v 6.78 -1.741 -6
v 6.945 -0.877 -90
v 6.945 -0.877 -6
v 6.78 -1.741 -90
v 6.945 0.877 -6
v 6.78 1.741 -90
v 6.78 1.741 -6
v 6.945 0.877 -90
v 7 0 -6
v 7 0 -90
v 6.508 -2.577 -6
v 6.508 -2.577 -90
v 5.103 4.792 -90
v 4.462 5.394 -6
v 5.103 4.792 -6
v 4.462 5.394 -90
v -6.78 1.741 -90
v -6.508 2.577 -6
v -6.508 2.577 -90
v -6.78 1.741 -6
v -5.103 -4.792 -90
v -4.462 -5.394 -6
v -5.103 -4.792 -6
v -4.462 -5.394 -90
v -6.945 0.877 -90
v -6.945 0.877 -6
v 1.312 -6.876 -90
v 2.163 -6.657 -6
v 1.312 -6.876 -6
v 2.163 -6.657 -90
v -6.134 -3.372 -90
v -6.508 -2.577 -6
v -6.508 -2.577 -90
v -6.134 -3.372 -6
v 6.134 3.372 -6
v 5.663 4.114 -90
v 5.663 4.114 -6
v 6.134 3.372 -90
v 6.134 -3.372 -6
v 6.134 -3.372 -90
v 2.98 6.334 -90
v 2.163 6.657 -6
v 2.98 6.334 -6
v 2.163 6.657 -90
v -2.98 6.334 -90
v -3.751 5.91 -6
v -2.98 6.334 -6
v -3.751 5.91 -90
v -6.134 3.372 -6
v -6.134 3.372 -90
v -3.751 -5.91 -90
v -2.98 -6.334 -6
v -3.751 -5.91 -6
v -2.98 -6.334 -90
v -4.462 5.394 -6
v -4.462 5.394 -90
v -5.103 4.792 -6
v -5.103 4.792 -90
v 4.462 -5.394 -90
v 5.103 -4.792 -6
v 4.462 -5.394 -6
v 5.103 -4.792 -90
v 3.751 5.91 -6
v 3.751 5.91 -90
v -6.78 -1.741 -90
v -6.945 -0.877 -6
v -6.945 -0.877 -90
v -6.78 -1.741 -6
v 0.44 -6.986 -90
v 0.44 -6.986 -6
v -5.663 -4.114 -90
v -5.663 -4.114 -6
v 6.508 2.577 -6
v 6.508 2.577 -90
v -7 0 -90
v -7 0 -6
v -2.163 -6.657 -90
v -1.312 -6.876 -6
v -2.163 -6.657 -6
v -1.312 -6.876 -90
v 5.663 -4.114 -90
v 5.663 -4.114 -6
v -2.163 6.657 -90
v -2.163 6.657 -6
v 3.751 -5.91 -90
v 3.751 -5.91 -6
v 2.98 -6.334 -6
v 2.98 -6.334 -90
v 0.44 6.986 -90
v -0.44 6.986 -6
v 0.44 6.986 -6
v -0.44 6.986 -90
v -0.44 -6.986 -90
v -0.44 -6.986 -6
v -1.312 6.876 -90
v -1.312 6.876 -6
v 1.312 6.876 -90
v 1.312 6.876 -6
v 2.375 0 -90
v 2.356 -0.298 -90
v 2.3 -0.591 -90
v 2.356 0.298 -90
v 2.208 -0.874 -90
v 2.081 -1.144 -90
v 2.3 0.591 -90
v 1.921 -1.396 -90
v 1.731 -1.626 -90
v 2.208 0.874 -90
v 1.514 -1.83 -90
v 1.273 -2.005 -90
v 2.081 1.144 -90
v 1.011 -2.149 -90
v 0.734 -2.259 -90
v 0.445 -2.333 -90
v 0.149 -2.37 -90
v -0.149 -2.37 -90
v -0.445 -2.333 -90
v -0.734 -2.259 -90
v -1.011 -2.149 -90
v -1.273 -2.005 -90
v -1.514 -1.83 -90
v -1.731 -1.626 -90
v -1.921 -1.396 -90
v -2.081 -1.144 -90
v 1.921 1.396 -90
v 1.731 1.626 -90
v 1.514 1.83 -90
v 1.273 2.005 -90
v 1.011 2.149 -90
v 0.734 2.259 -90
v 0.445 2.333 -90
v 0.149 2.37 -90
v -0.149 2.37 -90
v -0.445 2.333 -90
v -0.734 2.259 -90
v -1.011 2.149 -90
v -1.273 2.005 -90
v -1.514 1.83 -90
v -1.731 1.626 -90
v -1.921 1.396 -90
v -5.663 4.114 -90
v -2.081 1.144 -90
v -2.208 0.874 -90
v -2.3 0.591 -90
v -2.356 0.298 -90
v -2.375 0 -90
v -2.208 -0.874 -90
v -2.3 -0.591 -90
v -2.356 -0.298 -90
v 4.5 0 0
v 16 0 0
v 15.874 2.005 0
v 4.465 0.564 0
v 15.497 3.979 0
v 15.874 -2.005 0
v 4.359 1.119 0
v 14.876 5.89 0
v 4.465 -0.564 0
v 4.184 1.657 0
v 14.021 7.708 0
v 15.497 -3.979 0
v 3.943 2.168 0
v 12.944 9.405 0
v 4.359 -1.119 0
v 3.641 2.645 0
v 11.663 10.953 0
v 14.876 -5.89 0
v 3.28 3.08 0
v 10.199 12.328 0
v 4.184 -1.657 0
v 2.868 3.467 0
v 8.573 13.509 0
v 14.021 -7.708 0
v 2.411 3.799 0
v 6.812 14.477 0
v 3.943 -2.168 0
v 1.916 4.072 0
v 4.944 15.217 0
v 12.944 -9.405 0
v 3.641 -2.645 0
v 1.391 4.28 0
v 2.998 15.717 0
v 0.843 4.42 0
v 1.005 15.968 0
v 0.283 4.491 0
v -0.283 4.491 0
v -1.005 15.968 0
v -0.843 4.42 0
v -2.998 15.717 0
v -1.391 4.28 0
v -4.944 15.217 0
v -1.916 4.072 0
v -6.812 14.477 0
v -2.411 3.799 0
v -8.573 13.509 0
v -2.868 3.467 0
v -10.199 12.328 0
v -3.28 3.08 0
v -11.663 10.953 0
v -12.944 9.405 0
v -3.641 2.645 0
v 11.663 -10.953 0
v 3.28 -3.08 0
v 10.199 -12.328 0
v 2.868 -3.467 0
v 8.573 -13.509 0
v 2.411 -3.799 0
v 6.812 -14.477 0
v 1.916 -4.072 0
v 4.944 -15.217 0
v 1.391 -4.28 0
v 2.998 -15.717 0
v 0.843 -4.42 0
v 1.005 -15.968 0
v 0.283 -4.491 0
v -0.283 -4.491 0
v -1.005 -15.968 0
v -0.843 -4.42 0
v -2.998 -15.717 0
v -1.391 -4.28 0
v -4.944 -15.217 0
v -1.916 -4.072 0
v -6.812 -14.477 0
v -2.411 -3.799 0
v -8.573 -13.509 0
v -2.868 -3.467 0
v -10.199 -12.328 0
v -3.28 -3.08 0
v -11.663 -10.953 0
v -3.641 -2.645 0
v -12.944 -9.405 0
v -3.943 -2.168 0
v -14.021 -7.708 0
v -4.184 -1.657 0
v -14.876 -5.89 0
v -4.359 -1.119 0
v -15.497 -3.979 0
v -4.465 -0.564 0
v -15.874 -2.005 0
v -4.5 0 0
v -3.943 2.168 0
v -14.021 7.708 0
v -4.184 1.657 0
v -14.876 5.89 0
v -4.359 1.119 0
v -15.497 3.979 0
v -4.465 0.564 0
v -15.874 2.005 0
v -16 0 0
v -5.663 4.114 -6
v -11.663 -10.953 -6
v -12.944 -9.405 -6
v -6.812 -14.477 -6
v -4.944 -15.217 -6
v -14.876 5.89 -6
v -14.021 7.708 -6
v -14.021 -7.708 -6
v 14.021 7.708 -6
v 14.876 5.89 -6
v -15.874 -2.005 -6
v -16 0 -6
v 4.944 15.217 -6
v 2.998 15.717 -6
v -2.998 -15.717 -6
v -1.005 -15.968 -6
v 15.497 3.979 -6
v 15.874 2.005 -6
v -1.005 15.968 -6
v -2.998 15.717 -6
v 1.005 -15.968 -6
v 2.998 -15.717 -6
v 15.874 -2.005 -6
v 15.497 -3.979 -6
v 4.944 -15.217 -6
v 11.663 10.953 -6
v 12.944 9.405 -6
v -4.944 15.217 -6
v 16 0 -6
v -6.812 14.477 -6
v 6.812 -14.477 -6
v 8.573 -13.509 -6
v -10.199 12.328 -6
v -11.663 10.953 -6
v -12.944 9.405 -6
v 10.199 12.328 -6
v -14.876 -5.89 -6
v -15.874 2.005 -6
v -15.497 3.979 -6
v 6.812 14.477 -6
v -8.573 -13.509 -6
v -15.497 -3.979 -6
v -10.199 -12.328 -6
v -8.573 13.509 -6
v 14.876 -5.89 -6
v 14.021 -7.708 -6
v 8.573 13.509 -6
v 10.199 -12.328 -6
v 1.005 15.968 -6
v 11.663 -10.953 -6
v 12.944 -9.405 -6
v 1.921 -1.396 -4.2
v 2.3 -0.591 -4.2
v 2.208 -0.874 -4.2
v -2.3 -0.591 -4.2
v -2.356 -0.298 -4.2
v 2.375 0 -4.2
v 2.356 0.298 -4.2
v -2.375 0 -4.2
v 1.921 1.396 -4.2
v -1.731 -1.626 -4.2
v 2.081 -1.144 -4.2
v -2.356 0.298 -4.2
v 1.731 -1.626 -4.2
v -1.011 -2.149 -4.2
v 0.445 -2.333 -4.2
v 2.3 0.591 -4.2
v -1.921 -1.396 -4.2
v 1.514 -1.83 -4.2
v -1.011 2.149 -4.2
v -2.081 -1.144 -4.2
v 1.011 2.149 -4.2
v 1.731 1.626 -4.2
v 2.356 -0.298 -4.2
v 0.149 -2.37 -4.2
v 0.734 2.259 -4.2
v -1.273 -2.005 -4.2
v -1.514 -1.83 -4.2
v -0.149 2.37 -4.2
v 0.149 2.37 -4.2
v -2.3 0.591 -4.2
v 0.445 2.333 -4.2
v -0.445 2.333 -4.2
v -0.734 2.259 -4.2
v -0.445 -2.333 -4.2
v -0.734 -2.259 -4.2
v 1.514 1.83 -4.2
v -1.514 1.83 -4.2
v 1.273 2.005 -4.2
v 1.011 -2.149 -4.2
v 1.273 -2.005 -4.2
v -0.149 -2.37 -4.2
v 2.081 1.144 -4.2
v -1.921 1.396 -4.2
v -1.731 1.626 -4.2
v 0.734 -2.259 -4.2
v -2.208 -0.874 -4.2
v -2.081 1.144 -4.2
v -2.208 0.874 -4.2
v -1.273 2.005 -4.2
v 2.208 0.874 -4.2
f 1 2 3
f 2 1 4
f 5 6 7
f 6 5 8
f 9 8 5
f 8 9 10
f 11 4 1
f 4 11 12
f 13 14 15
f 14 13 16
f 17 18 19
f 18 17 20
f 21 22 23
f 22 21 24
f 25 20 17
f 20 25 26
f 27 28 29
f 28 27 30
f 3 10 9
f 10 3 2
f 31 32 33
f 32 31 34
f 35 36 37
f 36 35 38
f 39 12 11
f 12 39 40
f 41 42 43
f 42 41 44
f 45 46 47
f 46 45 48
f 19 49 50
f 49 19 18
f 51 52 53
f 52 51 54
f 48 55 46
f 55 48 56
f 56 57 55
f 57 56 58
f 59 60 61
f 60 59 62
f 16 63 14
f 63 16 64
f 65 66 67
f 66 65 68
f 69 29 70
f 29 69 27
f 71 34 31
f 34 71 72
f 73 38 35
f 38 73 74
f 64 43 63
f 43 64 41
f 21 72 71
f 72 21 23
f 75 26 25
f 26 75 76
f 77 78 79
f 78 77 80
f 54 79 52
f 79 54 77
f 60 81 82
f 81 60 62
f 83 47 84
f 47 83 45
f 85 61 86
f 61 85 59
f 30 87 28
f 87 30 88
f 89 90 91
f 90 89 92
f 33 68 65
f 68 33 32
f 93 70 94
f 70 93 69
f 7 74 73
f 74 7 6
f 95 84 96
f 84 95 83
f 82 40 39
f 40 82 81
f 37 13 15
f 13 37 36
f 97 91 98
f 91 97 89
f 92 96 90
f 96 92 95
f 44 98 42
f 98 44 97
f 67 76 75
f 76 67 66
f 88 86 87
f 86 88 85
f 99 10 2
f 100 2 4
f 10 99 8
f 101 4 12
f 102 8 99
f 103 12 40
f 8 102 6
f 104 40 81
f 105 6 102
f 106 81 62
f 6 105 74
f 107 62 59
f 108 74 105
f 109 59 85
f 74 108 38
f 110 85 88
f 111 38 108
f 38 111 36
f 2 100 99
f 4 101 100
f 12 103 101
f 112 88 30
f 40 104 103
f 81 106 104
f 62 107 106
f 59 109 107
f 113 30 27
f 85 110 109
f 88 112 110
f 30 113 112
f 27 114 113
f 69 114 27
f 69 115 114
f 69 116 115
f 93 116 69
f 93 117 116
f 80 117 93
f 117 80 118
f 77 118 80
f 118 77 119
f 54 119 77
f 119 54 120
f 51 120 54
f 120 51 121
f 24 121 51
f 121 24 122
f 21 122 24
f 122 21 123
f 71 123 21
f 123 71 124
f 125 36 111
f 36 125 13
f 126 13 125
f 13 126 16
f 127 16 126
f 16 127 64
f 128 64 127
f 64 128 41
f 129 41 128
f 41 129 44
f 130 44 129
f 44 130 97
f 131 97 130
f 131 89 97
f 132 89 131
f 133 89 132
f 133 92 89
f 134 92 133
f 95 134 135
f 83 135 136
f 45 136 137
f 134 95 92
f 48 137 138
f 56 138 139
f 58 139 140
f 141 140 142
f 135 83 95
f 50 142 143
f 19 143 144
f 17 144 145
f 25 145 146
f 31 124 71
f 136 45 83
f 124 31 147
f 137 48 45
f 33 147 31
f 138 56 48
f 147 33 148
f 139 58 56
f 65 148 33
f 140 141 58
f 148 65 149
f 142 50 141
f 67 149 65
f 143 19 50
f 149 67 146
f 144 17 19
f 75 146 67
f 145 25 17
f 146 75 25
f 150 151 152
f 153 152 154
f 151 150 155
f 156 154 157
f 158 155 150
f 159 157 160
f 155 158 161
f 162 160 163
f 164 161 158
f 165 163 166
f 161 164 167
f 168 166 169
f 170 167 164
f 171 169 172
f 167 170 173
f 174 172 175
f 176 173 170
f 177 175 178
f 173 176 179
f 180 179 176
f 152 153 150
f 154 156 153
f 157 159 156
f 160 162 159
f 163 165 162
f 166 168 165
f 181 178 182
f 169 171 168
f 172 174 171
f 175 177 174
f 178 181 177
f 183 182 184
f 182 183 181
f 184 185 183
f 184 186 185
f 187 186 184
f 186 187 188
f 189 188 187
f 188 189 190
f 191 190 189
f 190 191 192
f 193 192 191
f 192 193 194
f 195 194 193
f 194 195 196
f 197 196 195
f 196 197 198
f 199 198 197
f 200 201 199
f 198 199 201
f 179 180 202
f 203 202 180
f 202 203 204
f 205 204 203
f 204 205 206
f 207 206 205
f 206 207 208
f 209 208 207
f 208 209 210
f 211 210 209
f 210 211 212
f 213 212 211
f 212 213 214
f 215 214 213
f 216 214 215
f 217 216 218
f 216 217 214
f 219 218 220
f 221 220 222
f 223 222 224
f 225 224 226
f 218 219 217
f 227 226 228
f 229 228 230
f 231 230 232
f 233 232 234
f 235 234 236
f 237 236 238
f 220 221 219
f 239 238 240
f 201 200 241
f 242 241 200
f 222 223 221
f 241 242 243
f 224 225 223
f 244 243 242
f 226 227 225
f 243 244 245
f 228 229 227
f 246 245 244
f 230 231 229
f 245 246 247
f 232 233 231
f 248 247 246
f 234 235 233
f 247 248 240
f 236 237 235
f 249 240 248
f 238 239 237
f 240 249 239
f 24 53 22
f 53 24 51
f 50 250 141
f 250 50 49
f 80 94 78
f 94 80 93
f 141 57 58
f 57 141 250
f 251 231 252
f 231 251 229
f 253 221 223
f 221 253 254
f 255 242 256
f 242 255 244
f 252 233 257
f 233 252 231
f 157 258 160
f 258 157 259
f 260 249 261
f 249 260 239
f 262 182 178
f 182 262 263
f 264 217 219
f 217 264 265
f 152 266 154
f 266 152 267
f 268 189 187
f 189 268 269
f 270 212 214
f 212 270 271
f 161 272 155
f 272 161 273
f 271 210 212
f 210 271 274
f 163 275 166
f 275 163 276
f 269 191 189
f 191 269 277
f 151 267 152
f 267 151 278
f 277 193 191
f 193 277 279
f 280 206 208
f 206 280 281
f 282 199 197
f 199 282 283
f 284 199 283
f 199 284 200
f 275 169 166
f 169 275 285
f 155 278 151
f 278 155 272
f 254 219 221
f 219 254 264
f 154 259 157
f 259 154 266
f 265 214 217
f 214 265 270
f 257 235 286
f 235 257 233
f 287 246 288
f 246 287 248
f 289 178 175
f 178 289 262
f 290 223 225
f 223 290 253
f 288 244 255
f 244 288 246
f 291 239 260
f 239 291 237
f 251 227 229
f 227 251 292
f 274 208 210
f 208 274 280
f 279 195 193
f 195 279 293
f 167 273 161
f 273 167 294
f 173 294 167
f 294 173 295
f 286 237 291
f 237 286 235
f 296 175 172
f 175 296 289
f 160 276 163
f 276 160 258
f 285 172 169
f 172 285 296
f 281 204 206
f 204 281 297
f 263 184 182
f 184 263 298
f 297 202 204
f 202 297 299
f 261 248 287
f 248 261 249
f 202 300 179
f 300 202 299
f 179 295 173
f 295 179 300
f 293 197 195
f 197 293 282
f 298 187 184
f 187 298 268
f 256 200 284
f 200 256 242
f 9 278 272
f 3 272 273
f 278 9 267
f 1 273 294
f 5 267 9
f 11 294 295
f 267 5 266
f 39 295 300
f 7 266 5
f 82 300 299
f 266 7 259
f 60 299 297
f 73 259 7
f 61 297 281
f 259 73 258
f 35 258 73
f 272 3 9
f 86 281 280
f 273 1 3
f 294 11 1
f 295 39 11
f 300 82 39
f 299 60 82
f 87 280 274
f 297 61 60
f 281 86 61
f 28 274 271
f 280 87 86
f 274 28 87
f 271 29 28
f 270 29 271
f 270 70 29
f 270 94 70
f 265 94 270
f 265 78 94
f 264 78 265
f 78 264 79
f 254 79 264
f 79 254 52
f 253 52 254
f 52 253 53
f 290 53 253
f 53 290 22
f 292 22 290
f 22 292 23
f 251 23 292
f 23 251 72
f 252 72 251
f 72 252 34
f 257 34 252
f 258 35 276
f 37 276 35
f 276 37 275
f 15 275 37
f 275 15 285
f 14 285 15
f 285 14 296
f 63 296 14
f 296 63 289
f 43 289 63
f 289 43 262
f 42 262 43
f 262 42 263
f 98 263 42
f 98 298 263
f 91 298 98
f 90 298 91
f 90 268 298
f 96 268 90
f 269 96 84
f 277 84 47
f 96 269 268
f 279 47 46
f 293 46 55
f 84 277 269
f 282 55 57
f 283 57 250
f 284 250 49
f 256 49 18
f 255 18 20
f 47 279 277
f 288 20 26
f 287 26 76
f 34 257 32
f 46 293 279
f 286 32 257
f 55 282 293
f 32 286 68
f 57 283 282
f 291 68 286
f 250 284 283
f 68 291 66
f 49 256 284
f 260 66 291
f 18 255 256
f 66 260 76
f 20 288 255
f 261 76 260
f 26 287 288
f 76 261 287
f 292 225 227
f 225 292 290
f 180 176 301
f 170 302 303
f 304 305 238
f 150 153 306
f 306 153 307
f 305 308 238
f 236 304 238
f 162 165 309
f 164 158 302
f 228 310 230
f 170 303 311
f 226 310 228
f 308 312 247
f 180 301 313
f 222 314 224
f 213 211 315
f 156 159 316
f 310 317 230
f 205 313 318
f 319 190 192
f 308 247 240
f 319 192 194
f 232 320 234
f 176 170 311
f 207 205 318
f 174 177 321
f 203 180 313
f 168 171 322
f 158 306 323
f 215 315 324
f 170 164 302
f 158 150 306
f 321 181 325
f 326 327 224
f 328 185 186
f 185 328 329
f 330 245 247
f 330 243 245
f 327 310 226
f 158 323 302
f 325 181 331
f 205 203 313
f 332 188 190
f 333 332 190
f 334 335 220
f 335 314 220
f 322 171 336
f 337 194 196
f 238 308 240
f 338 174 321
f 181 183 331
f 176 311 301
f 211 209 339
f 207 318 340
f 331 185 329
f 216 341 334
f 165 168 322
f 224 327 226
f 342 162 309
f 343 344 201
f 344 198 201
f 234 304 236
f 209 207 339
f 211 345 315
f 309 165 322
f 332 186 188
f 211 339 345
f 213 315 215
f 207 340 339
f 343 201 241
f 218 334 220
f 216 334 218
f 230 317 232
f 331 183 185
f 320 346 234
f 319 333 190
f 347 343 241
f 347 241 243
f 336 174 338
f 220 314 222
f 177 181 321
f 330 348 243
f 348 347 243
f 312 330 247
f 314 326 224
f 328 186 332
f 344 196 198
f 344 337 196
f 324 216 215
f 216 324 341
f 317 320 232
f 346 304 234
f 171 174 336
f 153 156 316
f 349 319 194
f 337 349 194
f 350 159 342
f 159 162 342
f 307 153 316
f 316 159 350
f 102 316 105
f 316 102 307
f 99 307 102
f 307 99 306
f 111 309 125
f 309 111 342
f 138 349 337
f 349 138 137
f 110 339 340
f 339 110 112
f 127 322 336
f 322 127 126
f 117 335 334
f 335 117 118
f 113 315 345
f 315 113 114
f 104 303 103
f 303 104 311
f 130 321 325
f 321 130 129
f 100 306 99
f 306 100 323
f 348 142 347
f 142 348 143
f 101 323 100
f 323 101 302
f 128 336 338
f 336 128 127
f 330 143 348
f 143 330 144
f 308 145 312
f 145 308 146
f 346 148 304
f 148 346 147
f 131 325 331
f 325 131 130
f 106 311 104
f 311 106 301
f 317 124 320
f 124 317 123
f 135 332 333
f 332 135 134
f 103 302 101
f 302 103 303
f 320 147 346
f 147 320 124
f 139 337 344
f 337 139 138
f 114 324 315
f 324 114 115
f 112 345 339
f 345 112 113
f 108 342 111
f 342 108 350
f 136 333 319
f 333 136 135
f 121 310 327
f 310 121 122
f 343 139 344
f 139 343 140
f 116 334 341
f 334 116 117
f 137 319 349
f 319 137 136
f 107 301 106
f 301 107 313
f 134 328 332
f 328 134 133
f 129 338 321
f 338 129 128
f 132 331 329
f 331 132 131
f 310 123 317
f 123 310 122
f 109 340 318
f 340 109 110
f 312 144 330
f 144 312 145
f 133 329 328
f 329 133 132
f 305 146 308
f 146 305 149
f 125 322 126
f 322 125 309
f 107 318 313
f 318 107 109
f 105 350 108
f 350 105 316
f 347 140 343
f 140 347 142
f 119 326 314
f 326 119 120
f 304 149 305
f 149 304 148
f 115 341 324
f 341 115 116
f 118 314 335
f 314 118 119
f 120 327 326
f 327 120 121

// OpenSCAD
$fn = 50;


difference() {
	union() {
		translate(v = [0, 0, -90.0000000000]) {
			cylinder(h = 90, r = 7.0000000000);
		}
		translate(v = [0, 0, -6.0000000000]) {
			cylinder(h = 6, r = 16.0000000000);
		}
	}
	union() {
		translate(v = [0, 0, 0]) {
			rotate(a = [0, 0, 0]) {
				difference() {
					union() {
						#translate(v = [0, 0, -90.0000000000]) {
							cylinder(h = 90, r = 2.2500000000);
						}
						#translate(v = [0, 0, -4.2000000000]) {
							cylinder(h = 4.2000000000, r = 7.0000000000, r1 = 2.3750000000, r2 = 4.5000000000);
						}
						#translate(v = [0, 0, -90.0000000000]) {
							cylinder(h = 90, r = 2.3750000000);
						}
						#translate(v = [0, 0, -90.0000000000]) {
							cylinder(h = 90, r = 2.2500000000);
						}
					}
					union();
				}
			}
		}
	}
}
